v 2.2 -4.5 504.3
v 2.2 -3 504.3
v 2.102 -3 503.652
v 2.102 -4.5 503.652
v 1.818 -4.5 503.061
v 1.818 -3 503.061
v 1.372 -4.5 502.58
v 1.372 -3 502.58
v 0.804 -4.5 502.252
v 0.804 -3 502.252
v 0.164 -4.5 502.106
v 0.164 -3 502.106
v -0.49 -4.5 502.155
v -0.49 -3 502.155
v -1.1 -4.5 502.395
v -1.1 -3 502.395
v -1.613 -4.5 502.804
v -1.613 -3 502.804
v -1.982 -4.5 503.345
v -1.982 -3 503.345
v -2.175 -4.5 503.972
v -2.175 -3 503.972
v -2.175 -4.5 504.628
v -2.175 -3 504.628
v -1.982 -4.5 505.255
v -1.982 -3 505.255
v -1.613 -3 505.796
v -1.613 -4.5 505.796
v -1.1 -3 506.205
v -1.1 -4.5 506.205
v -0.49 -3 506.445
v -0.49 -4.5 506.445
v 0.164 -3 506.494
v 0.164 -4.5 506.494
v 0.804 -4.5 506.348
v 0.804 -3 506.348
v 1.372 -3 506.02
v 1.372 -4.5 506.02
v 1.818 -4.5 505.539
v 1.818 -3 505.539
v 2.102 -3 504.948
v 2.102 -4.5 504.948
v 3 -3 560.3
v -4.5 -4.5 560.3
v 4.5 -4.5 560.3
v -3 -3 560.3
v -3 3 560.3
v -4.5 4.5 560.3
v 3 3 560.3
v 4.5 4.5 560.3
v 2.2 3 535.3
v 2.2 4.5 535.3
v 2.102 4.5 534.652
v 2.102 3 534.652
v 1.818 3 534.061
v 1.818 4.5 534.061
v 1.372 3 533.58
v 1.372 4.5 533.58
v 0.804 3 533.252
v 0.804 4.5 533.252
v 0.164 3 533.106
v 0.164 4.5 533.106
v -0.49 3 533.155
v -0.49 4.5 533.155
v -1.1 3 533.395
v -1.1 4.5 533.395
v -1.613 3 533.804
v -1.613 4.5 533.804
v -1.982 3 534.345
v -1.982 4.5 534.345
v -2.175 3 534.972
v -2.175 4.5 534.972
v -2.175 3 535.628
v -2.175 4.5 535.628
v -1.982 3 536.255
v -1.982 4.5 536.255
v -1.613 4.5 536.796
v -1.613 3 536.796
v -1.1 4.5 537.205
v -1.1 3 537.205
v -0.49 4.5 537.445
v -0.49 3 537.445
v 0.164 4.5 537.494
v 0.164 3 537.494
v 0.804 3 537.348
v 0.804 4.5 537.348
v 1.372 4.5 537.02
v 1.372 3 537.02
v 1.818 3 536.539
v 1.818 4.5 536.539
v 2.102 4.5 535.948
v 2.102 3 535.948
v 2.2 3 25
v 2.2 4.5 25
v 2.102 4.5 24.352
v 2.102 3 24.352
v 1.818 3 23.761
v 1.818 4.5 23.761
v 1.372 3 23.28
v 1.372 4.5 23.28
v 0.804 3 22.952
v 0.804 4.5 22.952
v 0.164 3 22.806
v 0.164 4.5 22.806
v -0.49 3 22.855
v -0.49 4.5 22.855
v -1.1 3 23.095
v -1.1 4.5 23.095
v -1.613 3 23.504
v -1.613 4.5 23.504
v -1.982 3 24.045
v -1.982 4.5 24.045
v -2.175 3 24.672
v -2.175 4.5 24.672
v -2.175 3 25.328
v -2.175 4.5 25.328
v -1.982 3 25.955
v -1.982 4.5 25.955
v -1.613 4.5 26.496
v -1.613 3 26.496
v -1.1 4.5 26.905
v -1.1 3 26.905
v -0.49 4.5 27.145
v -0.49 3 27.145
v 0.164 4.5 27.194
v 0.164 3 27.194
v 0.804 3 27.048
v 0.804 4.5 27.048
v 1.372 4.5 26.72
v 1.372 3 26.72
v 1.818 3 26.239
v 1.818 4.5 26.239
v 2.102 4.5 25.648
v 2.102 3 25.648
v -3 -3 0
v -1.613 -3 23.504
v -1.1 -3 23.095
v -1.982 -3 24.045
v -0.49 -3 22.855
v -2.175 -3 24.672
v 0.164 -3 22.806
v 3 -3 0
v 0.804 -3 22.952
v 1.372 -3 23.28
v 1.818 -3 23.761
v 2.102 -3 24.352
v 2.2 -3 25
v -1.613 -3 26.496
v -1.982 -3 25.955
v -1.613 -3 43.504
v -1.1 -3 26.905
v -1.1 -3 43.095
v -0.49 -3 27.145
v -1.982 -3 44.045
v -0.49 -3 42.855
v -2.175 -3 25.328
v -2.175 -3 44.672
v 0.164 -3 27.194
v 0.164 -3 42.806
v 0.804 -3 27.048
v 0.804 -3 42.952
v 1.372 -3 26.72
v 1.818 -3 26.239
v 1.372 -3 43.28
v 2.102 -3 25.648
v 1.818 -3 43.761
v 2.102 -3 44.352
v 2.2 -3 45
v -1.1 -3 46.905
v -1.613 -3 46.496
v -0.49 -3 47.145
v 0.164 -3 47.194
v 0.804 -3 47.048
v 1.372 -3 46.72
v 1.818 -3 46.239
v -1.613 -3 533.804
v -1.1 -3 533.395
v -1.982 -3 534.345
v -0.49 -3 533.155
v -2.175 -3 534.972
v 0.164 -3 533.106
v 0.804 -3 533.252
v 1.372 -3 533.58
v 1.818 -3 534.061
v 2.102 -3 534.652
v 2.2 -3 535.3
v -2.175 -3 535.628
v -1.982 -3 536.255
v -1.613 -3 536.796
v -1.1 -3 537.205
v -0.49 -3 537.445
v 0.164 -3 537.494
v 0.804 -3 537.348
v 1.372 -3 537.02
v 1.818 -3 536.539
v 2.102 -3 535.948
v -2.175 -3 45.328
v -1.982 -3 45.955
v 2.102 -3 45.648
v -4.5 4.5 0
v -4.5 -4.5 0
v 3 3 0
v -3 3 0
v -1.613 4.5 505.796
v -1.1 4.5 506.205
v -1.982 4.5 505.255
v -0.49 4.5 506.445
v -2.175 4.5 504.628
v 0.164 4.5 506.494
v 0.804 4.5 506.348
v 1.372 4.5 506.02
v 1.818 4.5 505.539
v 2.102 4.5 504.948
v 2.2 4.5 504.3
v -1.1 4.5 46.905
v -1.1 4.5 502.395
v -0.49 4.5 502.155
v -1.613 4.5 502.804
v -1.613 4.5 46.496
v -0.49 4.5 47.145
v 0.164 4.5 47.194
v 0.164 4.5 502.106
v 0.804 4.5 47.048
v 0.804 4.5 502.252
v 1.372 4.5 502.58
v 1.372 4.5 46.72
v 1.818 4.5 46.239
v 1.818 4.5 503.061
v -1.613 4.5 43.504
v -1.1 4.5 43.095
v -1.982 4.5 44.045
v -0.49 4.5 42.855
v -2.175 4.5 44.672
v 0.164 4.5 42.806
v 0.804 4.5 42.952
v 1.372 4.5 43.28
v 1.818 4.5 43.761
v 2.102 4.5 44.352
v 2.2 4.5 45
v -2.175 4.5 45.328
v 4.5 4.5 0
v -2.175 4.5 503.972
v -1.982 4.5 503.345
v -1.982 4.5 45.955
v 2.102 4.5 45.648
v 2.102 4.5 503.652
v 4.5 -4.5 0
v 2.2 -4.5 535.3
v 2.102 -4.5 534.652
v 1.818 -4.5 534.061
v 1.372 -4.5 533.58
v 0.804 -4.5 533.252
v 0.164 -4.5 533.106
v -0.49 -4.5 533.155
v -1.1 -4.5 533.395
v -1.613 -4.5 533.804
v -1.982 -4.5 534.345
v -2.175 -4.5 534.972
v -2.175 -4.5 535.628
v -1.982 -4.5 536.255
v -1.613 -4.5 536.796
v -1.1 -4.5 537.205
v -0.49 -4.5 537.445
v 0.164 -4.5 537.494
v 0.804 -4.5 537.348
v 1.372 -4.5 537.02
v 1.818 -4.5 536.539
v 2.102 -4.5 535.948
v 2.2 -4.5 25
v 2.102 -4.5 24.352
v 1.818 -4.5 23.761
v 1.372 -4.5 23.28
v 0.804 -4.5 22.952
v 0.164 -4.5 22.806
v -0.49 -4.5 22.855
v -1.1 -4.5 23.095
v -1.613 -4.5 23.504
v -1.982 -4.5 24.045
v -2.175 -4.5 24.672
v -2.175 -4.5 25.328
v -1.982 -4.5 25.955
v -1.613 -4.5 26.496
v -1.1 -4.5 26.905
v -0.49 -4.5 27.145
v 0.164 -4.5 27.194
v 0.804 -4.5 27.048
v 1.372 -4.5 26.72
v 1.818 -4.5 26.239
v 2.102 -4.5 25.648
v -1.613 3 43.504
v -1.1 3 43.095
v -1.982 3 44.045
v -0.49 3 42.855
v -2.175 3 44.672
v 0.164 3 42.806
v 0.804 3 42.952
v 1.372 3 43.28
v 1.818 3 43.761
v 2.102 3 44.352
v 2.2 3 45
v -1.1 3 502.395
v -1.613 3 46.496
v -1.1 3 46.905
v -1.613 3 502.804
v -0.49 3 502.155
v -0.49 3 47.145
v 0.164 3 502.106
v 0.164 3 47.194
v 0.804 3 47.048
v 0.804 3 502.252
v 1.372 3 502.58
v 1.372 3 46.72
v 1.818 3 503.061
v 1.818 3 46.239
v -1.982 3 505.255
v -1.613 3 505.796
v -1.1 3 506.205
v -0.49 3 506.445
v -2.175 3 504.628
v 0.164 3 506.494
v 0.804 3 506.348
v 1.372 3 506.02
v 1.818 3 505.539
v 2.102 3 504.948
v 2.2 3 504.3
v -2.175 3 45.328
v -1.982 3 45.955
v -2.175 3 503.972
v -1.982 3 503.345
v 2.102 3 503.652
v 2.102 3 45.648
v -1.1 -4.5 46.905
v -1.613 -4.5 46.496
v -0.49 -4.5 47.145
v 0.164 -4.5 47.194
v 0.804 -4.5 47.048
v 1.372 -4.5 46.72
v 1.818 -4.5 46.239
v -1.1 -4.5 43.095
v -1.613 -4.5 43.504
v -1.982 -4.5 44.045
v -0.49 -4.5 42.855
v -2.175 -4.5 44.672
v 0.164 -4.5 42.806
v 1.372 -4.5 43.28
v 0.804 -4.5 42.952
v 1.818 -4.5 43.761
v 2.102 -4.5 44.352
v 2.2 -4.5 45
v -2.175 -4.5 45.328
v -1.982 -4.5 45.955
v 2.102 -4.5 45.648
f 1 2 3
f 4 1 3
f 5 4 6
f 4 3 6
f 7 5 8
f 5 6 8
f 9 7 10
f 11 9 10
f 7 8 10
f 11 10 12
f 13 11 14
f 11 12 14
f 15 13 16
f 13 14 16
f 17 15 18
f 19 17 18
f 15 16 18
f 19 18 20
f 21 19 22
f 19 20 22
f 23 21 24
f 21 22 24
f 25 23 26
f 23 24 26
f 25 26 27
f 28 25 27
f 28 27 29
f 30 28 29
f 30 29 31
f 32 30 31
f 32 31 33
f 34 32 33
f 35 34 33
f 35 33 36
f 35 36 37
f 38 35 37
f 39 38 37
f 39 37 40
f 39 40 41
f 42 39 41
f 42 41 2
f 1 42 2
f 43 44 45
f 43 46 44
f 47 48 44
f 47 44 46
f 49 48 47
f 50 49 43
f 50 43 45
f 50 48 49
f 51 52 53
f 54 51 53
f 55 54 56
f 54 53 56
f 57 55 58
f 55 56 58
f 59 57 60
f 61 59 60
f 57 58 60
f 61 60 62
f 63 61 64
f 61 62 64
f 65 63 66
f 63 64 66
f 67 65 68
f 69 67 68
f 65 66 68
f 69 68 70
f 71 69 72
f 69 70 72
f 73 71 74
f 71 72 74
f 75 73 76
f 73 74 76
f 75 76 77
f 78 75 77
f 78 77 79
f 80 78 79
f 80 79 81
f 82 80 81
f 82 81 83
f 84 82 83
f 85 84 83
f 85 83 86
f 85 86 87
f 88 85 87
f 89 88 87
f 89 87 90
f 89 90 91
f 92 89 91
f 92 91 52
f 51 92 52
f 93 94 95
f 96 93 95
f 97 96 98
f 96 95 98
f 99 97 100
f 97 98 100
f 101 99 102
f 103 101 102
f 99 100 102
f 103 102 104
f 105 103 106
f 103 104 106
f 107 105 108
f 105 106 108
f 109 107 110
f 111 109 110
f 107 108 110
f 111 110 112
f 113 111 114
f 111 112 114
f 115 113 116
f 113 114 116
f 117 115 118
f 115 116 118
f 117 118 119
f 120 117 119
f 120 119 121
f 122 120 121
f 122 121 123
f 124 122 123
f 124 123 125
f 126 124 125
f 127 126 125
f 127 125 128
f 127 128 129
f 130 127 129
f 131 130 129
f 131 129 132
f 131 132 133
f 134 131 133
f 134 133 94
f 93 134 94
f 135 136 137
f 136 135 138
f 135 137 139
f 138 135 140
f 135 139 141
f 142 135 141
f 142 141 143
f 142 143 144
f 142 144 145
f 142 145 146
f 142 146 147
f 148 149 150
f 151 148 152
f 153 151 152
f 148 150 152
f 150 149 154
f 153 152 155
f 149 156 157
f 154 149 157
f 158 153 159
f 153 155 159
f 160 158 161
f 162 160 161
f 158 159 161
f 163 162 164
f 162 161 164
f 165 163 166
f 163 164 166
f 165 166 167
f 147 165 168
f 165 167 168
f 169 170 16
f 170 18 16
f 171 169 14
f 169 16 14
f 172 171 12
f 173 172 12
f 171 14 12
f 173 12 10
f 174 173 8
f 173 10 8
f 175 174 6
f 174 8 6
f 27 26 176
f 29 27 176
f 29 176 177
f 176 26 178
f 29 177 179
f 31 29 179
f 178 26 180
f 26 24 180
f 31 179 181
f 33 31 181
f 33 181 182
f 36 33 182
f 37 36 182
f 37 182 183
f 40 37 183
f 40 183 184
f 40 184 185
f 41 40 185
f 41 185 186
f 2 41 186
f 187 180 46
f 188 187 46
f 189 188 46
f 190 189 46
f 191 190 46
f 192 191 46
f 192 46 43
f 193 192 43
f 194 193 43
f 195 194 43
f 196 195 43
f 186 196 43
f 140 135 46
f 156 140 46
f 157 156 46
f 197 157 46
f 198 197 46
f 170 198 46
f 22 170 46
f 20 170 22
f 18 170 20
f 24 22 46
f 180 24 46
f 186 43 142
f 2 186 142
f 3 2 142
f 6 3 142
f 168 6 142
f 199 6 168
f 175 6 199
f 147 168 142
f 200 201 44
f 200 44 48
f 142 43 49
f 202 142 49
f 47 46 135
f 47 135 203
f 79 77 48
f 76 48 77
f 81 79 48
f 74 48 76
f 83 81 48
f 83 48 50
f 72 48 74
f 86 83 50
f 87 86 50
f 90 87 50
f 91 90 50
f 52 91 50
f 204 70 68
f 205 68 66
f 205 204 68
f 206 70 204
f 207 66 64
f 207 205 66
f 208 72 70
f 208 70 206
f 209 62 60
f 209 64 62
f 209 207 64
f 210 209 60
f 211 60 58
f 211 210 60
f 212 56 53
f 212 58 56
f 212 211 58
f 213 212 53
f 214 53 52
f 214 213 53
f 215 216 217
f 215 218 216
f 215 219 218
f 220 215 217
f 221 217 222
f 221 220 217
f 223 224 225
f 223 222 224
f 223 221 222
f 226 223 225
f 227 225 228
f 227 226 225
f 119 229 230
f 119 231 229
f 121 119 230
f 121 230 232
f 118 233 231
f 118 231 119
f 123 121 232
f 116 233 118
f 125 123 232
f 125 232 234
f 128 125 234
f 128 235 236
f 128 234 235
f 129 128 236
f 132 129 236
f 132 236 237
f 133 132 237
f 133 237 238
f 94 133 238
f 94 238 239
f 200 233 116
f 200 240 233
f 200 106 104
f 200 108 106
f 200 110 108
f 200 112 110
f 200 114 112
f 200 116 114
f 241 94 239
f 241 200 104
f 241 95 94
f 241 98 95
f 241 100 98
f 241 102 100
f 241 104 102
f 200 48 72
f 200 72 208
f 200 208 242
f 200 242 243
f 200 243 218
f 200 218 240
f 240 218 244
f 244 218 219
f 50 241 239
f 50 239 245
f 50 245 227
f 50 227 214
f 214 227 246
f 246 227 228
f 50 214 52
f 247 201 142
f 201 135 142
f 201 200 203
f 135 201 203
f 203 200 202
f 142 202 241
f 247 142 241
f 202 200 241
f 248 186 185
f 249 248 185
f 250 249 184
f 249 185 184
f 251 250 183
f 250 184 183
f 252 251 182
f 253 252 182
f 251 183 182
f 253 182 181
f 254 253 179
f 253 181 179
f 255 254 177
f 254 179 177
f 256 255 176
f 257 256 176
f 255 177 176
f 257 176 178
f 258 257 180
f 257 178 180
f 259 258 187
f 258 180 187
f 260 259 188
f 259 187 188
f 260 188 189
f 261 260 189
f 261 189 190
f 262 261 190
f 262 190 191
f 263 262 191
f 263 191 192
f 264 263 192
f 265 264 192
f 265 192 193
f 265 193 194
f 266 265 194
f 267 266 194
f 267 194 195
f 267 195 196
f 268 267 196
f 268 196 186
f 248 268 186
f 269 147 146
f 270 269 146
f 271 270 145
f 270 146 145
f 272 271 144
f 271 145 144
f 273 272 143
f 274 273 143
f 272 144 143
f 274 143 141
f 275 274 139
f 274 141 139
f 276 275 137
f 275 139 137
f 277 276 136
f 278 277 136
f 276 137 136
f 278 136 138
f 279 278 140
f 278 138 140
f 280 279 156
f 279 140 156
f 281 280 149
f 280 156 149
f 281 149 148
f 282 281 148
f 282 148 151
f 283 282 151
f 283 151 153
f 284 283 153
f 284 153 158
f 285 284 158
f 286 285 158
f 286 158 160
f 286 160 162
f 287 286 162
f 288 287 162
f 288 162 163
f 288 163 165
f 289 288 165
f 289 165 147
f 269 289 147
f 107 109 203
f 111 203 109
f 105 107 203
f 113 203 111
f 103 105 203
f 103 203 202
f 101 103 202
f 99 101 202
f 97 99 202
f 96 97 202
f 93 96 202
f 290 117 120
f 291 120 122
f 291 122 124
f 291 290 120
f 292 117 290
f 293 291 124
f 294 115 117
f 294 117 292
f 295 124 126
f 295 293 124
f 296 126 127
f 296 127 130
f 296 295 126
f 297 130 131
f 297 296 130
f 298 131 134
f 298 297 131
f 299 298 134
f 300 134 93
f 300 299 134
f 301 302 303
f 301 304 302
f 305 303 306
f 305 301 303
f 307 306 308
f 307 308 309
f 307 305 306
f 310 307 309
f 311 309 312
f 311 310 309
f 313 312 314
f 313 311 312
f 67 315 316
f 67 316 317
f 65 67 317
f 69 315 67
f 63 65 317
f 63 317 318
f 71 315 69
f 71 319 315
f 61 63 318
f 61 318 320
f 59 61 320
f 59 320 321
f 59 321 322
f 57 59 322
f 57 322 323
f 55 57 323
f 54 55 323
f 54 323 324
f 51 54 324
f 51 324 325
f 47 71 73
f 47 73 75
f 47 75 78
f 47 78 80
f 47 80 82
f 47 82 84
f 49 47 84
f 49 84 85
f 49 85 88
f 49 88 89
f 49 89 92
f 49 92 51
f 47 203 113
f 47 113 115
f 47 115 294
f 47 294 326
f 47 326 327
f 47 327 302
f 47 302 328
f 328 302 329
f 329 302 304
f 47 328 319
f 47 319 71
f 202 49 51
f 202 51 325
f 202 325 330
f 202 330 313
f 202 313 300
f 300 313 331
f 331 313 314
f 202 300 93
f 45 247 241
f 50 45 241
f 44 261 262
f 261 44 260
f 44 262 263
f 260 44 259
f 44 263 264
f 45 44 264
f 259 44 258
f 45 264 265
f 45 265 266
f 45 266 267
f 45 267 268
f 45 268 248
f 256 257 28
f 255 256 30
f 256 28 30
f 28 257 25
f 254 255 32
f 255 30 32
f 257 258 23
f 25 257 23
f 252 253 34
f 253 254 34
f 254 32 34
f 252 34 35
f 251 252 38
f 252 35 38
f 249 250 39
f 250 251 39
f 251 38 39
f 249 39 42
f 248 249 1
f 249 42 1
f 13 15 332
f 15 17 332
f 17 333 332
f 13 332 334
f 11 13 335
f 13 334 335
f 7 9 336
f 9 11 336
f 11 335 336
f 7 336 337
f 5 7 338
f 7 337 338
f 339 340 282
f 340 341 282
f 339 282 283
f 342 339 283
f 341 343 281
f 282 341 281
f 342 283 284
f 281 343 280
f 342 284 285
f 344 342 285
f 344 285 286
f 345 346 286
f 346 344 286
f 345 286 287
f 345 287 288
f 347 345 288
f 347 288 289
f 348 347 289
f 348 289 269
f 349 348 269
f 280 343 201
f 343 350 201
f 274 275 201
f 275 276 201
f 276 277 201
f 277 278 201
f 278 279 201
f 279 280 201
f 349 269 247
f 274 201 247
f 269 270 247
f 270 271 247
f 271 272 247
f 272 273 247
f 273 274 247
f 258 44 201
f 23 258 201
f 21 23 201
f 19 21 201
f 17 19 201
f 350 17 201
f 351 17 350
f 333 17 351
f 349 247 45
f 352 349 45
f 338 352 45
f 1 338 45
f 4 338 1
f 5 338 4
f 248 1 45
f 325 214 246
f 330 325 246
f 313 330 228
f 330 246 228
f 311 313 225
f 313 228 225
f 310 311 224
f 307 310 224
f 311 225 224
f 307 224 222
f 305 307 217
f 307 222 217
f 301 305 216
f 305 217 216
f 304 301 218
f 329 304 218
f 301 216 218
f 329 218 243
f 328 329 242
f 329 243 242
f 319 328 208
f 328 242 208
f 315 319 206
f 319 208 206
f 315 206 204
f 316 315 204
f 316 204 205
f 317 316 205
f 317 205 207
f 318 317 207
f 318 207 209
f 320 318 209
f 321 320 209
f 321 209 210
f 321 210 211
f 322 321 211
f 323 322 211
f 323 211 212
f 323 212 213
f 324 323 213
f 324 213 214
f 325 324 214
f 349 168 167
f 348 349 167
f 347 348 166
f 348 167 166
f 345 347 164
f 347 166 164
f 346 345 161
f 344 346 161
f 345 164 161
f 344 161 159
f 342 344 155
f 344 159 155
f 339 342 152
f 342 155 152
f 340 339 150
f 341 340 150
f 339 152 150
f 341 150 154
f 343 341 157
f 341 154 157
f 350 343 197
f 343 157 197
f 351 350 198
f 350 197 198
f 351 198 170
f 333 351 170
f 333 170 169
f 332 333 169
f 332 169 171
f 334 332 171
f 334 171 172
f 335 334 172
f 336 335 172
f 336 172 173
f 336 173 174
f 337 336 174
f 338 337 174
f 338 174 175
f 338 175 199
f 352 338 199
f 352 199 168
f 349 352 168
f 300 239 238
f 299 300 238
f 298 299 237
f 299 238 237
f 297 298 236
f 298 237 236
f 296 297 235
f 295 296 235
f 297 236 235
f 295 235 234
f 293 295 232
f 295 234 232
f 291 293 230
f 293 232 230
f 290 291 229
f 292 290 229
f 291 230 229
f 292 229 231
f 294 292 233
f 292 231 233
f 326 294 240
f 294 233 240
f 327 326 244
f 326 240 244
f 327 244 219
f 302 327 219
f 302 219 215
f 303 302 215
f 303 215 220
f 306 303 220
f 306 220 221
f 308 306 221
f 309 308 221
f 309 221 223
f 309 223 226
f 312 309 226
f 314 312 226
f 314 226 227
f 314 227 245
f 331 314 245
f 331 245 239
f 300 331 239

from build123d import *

# Parameters (mm, degrees)
SKETCH_1_W          = 9
SKETCH_1_H          = 9
EXTRUDE_1_DEPTH     = 560.3
SKETCH_2_W          = 6
SKETCH_2_H          = 6
CUT_EXTRUDE_1_DEPTH = 560.3
SKETCH_3_R          = 2.2
CUT_EXTRUDE_2_DEPTH = 582
SKETCH_4_R          = 2.2
CUT_EXTRUDE_3_DEPTH = 20


with BuildPart() as part:
    # ｽｹｯﾁ1 → ﾎﾞｽ - 押し出し1 (new body)
    with BuildSketch(Plane.XY):
        Rectangle(SKETCH_1_W, SKETCH_1_H)
    extrude(amount=EXTRUDE_1_DEPTH)

    # ｽｹｯﾁ2 → ｶｯﾄ - 押し出し1 (cut)
    with BuildSketch(Plane.XY.offset(560.3)):
        Rectangle(SKETCH_2_W, SKETCH_2_H)
    extrude(amount=-CUT_EXTRUDE_1_DEPTH, mode=Mode.SUBTRACT)

    # ｽｹｯﾁ3 → ｶｯﾄ - 押し出し2 (cut)
    with BuildSketch(Plane(origin=(0, 4.5, 0), x_dir=(1, 0, 0), z_dir=(0, 1, 0))):
        with Locations((0, -25)):
            Circle(SKETCH_3_R)
        with Locations((0, -45)):
            Circle(SKETCH_3_R)
    extrude(amount=-CUT_EXTRUDE_2_DEPTH, mode=Mode.SUBTRACT)

    # ｽｹｯﾁ4 → ｶｯﾄ - 押し出し3 (cut)
    with BuildSketch(Plane(origin=(0, 4.5, 0), x_dir=(1, 0, 0), z_dir=(0, 1, 0))):
        with Locations((0, -535.3)):
            Circle(SKETCH_4_R)
        with Locations((0, -504.3)):
            Circle(SKETCH_4_R)
    extrude(amount=-CUT_EXTRUDE_3_DEPTH, mode=Mode.SUBTRACT)


solid = part.part
